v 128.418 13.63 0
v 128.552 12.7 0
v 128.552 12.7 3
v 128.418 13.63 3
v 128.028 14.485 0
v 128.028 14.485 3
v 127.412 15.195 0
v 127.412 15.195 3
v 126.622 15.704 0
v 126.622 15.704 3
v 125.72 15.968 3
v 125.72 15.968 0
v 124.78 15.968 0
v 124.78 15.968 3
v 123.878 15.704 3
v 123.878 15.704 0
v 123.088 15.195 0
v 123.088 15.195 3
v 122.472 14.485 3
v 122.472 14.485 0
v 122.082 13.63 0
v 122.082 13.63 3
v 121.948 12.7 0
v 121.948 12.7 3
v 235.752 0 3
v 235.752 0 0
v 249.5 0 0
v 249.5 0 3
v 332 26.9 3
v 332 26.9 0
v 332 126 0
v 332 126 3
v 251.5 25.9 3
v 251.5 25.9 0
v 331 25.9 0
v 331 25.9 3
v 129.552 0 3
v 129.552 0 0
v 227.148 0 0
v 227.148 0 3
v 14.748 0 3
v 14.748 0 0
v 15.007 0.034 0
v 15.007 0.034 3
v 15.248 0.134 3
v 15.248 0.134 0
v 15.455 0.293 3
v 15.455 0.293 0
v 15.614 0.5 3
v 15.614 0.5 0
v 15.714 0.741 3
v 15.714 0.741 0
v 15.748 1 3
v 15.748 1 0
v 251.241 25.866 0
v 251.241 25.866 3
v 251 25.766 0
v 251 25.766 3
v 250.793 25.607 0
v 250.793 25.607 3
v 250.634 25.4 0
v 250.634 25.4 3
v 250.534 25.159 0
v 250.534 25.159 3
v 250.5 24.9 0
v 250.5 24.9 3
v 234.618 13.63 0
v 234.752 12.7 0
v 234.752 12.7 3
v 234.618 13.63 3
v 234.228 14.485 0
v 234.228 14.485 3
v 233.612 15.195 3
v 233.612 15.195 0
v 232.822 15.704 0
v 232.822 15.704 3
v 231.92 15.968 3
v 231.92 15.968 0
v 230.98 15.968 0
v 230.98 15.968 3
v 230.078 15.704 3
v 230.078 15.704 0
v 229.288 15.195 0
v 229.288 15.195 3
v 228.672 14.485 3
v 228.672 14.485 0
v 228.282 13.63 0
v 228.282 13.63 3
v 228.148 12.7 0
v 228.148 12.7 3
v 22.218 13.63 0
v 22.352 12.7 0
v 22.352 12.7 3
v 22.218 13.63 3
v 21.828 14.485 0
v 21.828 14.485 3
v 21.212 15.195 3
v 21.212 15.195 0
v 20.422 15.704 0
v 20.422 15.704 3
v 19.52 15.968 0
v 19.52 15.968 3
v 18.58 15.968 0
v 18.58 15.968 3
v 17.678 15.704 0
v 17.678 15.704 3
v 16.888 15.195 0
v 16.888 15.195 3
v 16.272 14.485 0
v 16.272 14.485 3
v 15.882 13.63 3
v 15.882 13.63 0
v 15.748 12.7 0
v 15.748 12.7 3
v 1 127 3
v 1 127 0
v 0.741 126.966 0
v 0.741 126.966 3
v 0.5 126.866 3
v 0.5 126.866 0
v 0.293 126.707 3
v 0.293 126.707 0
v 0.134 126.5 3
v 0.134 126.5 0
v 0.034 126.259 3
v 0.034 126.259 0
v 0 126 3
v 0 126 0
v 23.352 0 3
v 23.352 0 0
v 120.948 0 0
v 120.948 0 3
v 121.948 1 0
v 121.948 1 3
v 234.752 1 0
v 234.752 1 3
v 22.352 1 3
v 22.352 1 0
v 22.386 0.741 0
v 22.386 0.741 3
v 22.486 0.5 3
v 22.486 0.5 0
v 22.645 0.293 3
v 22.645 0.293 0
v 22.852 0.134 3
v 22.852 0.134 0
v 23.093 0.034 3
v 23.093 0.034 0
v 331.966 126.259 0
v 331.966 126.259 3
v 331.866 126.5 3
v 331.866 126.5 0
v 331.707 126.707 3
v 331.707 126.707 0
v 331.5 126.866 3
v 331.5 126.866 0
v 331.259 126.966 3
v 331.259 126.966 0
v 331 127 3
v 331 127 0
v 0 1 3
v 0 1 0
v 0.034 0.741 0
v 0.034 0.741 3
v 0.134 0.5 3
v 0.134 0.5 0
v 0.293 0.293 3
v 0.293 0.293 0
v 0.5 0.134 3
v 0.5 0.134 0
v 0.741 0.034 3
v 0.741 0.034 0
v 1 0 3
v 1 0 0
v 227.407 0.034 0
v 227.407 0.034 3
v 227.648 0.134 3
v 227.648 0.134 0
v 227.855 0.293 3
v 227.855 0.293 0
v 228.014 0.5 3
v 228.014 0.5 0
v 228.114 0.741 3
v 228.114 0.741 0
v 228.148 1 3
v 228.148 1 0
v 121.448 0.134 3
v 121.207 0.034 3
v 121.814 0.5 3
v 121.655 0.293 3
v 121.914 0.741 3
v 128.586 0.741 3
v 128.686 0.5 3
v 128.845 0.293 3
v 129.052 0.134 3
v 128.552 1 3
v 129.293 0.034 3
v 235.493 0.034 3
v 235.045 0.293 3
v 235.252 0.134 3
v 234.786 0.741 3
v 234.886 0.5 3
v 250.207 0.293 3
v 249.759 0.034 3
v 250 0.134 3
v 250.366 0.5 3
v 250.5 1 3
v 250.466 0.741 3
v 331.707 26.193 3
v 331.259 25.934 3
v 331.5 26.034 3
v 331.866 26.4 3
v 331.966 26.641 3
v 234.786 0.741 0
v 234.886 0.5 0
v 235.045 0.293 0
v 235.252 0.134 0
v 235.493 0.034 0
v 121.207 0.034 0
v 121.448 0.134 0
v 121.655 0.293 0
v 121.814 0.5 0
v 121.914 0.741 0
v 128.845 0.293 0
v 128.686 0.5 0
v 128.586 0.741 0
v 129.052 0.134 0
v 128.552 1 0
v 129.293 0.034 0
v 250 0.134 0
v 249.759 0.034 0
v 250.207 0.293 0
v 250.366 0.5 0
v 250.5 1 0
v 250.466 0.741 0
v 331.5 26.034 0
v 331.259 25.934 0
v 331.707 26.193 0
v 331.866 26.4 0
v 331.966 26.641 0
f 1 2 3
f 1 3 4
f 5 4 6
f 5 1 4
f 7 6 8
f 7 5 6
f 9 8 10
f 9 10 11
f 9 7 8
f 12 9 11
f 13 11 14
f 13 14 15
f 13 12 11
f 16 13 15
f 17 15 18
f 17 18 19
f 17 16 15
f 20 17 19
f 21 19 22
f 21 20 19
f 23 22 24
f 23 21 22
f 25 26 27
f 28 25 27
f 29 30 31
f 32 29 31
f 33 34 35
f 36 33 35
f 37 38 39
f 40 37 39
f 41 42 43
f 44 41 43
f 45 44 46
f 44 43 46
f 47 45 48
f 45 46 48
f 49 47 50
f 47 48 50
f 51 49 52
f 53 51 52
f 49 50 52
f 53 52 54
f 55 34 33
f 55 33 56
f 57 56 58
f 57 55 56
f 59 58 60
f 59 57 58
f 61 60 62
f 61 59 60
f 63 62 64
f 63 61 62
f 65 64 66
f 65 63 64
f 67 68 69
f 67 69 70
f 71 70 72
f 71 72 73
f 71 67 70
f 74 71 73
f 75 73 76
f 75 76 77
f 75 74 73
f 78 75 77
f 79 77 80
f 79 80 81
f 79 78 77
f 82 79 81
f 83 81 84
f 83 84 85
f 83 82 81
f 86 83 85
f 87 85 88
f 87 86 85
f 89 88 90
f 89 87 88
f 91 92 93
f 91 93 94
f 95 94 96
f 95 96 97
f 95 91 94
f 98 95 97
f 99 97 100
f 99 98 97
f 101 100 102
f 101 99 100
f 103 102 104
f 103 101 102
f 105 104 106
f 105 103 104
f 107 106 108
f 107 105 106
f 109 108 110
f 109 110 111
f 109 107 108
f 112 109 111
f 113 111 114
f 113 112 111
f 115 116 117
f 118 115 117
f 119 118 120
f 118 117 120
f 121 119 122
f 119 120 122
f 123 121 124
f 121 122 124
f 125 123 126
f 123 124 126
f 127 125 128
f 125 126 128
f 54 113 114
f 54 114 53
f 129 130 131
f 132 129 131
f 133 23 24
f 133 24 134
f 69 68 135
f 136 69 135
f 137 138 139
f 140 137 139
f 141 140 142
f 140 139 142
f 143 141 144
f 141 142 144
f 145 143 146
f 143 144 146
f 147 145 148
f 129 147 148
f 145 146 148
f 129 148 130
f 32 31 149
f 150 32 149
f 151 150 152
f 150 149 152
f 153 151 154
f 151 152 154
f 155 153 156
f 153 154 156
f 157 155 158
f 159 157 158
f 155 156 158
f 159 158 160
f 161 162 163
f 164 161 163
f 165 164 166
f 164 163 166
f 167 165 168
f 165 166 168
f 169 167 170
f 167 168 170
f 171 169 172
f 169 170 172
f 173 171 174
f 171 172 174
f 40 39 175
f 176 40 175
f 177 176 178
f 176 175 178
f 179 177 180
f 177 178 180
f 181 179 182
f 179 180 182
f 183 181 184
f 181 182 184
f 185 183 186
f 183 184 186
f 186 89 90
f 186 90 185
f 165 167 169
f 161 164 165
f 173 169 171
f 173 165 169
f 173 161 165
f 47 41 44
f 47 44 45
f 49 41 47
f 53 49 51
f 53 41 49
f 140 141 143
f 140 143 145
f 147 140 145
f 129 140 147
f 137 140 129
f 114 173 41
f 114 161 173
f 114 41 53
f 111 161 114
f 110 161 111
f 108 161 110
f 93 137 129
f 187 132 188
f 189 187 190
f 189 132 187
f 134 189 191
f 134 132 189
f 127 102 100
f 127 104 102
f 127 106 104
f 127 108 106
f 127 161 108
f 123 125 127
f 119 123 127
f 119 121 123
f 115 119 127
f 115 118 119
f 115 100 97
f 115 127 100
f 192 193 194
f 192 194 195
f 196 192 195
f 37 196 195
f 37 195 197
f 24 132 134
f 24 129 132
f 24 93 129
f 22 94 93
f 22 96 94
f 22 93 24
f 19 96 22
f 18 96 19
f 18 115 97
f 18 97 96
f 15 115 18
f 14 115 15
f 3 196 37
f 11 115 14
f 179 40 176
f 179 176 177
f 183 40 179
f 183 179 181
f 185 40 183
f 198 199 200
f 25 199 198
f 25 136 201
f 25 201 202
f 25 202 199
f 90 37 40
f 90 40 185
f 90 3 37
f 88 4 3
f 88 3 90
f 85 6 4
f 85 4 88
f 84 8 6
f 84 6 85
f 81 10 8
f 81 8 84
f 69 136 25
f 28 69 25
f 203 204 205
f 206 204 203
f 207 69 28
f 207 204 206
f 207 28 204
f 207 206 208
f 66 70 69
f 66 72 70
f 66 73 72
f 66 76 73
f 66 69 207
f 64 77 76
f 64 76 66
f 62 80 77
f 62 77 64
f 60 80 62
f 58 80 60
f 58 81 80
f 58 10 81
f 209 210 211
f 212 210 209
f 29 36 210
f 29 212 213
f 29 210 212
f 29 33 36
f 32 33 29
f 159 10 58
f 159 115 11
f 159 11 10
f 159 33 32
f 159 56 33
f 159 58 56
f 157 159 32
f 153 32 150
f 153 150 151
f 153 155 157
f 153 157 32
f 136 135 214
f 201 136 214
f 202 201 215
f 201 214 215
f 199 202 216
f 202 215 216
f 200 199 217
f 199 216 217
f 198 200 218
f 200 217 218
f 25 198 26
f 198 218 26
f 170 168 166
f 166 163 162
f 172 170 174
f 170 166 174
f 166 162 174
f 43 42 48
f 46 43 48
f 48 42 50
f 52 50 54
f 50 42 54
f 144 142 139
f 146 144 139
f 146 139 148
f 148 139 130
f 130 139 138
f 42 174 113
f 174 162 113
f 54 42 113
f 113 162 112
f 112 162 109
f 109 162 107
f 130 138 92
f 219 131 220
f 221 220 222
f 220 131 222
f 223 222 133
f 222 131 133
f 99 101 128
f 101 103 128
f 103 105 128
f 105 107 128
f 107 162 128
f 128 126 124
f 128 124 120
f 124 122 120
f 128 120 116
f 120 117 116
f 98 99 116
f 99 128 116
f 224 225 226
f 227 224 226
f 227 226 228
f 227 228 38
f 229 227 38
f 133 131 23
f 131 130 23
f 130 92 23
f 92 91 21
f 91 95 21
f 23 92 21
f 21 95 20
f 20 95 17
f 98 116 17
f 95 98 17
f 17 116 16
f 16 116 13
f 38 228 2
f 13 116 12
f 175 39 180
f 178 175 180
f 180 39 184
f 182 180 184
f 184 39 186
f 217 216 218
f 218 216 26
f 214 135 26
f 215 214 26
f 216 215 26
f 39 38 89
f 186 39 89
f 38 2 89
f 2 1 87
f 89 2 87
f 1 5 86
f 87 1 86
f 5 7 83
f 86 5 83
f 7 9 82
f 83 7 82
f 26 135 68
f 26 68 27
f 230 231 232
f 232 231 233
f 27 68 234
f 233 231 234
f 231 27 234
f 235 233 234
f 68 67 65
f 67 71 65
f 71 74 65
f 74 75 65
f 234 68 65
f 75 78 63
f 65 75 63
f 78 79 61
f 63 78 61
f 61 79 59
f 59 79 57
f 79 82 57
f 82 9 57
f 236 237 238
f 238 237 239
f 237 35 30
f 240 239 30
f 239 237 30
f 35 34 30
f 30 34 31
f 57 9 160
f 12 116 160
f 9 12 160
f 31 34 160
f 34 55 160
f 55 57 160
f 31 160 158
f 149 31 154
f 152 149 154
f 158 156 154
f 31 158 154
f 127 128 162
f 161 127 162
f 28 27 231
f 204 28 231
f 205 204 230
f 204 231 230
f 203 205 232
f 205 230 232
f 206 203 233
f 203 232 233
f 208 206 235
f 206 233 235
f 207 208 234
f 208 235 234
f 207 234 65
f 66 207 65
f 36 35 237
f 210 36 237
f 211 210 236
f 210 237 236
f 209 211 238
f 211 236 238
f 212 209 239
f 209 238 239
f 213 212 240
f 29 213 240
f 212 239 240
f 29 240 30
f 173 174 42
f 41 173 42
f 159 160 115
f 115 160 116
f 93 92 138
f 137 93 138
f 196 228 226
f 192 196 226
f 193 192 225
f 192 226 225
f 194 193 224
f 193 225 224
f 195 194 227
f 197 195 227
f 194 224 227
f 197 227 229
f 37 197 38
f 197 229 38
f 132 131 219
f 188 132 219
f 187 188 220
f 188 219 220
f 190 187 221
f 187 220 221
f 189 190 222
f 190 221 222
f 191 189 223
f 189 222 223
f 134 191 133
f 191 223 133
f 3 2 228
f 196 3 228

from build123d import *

# Parameters (mm, degrees)
PAD_DEPTH = 3


with BuildPart() as part:
    # Sketch → Pad (new body)
    with BuildSketch(Plane.XY):
        with BuildLine():
            Line((0, 126), (0, 1))
            ThreePointArc((0, 1), (0.292893, 0.292893), (1, 0))
            Line((1, 0), (14.748, 0))
            ThreePointArc((14.748, 0), (15.455107, 0.292893), (15.748, 1))
            Line((15.748, 12.7), (15.748, 1))
            ThreePointArc((22.352, 12.7), (19.05, 16.002), (15.748, 12.7))
            Line((22.352, 12.7), (22.352, 1))
            ThreePointArc((22.352, 1), (22.644893, 0.292893), (23.352, 0))
            Line((23.352, 0), (120.948, 0))
            ThreePointArc((120.948, 0), (121.655107, 0.292893), (121.948, 1))
            Line((121.948, 12.7), (121.948, 1))
            ThreePointArc((128.552, 12.7), (125.25, 16.002), (121.948, 12.7))
            Line((128.552, 12.7), (128.552, 1))
            ThreePointArc((128.552, 1), (128.844893, 0.292893), (129.552, 0))
            Line((129.552, 0), (227.148, 0))
            ThreePointArc((227.148, 0), (227.855107, 0.292893), (228.148, 1))
            Line((228.148, 12.7), (228.148, 1))
            ThreePointArc((234.752, 12.7), (231.45, 16.002), (228.148, 12.7))
            Line((234.752, 12.7), (234.752, 1))
            ThreePointArc((234.752, 1), (235.044893, 0.292893), (235.752, 0))
            Line((235.752, 0), (249.5, 0))
            ThreePointArc((249.5, 0), (250.207107, 0.292893), (250.5, 1))
            Line((250.5, 1), (250.5, 24.9))
            ThreePointArc((251.5, 25.9), (250.792893, 25.607107), (250.5, 24.9))
            Line((251.5, 25.9), (330.9999, 25.9))
            ThreePointArc((330.9999, 25.9), (331.707007, 26.192893), (331.9999, 26.9))
            Line((331.9999, 26.9), (331.9999, 126))
            ThreePointArc((331.9999, 126), (331.707007, 126.707107), (330.9999, 127))
            Line((330.9999, 127), (1, 127))
            ThreePointArc((1, 127), (0.292893, 126.707107), (0, 126))
        make_face()
    extrude(amount=PAD_DEPTH)


solid = part.part
